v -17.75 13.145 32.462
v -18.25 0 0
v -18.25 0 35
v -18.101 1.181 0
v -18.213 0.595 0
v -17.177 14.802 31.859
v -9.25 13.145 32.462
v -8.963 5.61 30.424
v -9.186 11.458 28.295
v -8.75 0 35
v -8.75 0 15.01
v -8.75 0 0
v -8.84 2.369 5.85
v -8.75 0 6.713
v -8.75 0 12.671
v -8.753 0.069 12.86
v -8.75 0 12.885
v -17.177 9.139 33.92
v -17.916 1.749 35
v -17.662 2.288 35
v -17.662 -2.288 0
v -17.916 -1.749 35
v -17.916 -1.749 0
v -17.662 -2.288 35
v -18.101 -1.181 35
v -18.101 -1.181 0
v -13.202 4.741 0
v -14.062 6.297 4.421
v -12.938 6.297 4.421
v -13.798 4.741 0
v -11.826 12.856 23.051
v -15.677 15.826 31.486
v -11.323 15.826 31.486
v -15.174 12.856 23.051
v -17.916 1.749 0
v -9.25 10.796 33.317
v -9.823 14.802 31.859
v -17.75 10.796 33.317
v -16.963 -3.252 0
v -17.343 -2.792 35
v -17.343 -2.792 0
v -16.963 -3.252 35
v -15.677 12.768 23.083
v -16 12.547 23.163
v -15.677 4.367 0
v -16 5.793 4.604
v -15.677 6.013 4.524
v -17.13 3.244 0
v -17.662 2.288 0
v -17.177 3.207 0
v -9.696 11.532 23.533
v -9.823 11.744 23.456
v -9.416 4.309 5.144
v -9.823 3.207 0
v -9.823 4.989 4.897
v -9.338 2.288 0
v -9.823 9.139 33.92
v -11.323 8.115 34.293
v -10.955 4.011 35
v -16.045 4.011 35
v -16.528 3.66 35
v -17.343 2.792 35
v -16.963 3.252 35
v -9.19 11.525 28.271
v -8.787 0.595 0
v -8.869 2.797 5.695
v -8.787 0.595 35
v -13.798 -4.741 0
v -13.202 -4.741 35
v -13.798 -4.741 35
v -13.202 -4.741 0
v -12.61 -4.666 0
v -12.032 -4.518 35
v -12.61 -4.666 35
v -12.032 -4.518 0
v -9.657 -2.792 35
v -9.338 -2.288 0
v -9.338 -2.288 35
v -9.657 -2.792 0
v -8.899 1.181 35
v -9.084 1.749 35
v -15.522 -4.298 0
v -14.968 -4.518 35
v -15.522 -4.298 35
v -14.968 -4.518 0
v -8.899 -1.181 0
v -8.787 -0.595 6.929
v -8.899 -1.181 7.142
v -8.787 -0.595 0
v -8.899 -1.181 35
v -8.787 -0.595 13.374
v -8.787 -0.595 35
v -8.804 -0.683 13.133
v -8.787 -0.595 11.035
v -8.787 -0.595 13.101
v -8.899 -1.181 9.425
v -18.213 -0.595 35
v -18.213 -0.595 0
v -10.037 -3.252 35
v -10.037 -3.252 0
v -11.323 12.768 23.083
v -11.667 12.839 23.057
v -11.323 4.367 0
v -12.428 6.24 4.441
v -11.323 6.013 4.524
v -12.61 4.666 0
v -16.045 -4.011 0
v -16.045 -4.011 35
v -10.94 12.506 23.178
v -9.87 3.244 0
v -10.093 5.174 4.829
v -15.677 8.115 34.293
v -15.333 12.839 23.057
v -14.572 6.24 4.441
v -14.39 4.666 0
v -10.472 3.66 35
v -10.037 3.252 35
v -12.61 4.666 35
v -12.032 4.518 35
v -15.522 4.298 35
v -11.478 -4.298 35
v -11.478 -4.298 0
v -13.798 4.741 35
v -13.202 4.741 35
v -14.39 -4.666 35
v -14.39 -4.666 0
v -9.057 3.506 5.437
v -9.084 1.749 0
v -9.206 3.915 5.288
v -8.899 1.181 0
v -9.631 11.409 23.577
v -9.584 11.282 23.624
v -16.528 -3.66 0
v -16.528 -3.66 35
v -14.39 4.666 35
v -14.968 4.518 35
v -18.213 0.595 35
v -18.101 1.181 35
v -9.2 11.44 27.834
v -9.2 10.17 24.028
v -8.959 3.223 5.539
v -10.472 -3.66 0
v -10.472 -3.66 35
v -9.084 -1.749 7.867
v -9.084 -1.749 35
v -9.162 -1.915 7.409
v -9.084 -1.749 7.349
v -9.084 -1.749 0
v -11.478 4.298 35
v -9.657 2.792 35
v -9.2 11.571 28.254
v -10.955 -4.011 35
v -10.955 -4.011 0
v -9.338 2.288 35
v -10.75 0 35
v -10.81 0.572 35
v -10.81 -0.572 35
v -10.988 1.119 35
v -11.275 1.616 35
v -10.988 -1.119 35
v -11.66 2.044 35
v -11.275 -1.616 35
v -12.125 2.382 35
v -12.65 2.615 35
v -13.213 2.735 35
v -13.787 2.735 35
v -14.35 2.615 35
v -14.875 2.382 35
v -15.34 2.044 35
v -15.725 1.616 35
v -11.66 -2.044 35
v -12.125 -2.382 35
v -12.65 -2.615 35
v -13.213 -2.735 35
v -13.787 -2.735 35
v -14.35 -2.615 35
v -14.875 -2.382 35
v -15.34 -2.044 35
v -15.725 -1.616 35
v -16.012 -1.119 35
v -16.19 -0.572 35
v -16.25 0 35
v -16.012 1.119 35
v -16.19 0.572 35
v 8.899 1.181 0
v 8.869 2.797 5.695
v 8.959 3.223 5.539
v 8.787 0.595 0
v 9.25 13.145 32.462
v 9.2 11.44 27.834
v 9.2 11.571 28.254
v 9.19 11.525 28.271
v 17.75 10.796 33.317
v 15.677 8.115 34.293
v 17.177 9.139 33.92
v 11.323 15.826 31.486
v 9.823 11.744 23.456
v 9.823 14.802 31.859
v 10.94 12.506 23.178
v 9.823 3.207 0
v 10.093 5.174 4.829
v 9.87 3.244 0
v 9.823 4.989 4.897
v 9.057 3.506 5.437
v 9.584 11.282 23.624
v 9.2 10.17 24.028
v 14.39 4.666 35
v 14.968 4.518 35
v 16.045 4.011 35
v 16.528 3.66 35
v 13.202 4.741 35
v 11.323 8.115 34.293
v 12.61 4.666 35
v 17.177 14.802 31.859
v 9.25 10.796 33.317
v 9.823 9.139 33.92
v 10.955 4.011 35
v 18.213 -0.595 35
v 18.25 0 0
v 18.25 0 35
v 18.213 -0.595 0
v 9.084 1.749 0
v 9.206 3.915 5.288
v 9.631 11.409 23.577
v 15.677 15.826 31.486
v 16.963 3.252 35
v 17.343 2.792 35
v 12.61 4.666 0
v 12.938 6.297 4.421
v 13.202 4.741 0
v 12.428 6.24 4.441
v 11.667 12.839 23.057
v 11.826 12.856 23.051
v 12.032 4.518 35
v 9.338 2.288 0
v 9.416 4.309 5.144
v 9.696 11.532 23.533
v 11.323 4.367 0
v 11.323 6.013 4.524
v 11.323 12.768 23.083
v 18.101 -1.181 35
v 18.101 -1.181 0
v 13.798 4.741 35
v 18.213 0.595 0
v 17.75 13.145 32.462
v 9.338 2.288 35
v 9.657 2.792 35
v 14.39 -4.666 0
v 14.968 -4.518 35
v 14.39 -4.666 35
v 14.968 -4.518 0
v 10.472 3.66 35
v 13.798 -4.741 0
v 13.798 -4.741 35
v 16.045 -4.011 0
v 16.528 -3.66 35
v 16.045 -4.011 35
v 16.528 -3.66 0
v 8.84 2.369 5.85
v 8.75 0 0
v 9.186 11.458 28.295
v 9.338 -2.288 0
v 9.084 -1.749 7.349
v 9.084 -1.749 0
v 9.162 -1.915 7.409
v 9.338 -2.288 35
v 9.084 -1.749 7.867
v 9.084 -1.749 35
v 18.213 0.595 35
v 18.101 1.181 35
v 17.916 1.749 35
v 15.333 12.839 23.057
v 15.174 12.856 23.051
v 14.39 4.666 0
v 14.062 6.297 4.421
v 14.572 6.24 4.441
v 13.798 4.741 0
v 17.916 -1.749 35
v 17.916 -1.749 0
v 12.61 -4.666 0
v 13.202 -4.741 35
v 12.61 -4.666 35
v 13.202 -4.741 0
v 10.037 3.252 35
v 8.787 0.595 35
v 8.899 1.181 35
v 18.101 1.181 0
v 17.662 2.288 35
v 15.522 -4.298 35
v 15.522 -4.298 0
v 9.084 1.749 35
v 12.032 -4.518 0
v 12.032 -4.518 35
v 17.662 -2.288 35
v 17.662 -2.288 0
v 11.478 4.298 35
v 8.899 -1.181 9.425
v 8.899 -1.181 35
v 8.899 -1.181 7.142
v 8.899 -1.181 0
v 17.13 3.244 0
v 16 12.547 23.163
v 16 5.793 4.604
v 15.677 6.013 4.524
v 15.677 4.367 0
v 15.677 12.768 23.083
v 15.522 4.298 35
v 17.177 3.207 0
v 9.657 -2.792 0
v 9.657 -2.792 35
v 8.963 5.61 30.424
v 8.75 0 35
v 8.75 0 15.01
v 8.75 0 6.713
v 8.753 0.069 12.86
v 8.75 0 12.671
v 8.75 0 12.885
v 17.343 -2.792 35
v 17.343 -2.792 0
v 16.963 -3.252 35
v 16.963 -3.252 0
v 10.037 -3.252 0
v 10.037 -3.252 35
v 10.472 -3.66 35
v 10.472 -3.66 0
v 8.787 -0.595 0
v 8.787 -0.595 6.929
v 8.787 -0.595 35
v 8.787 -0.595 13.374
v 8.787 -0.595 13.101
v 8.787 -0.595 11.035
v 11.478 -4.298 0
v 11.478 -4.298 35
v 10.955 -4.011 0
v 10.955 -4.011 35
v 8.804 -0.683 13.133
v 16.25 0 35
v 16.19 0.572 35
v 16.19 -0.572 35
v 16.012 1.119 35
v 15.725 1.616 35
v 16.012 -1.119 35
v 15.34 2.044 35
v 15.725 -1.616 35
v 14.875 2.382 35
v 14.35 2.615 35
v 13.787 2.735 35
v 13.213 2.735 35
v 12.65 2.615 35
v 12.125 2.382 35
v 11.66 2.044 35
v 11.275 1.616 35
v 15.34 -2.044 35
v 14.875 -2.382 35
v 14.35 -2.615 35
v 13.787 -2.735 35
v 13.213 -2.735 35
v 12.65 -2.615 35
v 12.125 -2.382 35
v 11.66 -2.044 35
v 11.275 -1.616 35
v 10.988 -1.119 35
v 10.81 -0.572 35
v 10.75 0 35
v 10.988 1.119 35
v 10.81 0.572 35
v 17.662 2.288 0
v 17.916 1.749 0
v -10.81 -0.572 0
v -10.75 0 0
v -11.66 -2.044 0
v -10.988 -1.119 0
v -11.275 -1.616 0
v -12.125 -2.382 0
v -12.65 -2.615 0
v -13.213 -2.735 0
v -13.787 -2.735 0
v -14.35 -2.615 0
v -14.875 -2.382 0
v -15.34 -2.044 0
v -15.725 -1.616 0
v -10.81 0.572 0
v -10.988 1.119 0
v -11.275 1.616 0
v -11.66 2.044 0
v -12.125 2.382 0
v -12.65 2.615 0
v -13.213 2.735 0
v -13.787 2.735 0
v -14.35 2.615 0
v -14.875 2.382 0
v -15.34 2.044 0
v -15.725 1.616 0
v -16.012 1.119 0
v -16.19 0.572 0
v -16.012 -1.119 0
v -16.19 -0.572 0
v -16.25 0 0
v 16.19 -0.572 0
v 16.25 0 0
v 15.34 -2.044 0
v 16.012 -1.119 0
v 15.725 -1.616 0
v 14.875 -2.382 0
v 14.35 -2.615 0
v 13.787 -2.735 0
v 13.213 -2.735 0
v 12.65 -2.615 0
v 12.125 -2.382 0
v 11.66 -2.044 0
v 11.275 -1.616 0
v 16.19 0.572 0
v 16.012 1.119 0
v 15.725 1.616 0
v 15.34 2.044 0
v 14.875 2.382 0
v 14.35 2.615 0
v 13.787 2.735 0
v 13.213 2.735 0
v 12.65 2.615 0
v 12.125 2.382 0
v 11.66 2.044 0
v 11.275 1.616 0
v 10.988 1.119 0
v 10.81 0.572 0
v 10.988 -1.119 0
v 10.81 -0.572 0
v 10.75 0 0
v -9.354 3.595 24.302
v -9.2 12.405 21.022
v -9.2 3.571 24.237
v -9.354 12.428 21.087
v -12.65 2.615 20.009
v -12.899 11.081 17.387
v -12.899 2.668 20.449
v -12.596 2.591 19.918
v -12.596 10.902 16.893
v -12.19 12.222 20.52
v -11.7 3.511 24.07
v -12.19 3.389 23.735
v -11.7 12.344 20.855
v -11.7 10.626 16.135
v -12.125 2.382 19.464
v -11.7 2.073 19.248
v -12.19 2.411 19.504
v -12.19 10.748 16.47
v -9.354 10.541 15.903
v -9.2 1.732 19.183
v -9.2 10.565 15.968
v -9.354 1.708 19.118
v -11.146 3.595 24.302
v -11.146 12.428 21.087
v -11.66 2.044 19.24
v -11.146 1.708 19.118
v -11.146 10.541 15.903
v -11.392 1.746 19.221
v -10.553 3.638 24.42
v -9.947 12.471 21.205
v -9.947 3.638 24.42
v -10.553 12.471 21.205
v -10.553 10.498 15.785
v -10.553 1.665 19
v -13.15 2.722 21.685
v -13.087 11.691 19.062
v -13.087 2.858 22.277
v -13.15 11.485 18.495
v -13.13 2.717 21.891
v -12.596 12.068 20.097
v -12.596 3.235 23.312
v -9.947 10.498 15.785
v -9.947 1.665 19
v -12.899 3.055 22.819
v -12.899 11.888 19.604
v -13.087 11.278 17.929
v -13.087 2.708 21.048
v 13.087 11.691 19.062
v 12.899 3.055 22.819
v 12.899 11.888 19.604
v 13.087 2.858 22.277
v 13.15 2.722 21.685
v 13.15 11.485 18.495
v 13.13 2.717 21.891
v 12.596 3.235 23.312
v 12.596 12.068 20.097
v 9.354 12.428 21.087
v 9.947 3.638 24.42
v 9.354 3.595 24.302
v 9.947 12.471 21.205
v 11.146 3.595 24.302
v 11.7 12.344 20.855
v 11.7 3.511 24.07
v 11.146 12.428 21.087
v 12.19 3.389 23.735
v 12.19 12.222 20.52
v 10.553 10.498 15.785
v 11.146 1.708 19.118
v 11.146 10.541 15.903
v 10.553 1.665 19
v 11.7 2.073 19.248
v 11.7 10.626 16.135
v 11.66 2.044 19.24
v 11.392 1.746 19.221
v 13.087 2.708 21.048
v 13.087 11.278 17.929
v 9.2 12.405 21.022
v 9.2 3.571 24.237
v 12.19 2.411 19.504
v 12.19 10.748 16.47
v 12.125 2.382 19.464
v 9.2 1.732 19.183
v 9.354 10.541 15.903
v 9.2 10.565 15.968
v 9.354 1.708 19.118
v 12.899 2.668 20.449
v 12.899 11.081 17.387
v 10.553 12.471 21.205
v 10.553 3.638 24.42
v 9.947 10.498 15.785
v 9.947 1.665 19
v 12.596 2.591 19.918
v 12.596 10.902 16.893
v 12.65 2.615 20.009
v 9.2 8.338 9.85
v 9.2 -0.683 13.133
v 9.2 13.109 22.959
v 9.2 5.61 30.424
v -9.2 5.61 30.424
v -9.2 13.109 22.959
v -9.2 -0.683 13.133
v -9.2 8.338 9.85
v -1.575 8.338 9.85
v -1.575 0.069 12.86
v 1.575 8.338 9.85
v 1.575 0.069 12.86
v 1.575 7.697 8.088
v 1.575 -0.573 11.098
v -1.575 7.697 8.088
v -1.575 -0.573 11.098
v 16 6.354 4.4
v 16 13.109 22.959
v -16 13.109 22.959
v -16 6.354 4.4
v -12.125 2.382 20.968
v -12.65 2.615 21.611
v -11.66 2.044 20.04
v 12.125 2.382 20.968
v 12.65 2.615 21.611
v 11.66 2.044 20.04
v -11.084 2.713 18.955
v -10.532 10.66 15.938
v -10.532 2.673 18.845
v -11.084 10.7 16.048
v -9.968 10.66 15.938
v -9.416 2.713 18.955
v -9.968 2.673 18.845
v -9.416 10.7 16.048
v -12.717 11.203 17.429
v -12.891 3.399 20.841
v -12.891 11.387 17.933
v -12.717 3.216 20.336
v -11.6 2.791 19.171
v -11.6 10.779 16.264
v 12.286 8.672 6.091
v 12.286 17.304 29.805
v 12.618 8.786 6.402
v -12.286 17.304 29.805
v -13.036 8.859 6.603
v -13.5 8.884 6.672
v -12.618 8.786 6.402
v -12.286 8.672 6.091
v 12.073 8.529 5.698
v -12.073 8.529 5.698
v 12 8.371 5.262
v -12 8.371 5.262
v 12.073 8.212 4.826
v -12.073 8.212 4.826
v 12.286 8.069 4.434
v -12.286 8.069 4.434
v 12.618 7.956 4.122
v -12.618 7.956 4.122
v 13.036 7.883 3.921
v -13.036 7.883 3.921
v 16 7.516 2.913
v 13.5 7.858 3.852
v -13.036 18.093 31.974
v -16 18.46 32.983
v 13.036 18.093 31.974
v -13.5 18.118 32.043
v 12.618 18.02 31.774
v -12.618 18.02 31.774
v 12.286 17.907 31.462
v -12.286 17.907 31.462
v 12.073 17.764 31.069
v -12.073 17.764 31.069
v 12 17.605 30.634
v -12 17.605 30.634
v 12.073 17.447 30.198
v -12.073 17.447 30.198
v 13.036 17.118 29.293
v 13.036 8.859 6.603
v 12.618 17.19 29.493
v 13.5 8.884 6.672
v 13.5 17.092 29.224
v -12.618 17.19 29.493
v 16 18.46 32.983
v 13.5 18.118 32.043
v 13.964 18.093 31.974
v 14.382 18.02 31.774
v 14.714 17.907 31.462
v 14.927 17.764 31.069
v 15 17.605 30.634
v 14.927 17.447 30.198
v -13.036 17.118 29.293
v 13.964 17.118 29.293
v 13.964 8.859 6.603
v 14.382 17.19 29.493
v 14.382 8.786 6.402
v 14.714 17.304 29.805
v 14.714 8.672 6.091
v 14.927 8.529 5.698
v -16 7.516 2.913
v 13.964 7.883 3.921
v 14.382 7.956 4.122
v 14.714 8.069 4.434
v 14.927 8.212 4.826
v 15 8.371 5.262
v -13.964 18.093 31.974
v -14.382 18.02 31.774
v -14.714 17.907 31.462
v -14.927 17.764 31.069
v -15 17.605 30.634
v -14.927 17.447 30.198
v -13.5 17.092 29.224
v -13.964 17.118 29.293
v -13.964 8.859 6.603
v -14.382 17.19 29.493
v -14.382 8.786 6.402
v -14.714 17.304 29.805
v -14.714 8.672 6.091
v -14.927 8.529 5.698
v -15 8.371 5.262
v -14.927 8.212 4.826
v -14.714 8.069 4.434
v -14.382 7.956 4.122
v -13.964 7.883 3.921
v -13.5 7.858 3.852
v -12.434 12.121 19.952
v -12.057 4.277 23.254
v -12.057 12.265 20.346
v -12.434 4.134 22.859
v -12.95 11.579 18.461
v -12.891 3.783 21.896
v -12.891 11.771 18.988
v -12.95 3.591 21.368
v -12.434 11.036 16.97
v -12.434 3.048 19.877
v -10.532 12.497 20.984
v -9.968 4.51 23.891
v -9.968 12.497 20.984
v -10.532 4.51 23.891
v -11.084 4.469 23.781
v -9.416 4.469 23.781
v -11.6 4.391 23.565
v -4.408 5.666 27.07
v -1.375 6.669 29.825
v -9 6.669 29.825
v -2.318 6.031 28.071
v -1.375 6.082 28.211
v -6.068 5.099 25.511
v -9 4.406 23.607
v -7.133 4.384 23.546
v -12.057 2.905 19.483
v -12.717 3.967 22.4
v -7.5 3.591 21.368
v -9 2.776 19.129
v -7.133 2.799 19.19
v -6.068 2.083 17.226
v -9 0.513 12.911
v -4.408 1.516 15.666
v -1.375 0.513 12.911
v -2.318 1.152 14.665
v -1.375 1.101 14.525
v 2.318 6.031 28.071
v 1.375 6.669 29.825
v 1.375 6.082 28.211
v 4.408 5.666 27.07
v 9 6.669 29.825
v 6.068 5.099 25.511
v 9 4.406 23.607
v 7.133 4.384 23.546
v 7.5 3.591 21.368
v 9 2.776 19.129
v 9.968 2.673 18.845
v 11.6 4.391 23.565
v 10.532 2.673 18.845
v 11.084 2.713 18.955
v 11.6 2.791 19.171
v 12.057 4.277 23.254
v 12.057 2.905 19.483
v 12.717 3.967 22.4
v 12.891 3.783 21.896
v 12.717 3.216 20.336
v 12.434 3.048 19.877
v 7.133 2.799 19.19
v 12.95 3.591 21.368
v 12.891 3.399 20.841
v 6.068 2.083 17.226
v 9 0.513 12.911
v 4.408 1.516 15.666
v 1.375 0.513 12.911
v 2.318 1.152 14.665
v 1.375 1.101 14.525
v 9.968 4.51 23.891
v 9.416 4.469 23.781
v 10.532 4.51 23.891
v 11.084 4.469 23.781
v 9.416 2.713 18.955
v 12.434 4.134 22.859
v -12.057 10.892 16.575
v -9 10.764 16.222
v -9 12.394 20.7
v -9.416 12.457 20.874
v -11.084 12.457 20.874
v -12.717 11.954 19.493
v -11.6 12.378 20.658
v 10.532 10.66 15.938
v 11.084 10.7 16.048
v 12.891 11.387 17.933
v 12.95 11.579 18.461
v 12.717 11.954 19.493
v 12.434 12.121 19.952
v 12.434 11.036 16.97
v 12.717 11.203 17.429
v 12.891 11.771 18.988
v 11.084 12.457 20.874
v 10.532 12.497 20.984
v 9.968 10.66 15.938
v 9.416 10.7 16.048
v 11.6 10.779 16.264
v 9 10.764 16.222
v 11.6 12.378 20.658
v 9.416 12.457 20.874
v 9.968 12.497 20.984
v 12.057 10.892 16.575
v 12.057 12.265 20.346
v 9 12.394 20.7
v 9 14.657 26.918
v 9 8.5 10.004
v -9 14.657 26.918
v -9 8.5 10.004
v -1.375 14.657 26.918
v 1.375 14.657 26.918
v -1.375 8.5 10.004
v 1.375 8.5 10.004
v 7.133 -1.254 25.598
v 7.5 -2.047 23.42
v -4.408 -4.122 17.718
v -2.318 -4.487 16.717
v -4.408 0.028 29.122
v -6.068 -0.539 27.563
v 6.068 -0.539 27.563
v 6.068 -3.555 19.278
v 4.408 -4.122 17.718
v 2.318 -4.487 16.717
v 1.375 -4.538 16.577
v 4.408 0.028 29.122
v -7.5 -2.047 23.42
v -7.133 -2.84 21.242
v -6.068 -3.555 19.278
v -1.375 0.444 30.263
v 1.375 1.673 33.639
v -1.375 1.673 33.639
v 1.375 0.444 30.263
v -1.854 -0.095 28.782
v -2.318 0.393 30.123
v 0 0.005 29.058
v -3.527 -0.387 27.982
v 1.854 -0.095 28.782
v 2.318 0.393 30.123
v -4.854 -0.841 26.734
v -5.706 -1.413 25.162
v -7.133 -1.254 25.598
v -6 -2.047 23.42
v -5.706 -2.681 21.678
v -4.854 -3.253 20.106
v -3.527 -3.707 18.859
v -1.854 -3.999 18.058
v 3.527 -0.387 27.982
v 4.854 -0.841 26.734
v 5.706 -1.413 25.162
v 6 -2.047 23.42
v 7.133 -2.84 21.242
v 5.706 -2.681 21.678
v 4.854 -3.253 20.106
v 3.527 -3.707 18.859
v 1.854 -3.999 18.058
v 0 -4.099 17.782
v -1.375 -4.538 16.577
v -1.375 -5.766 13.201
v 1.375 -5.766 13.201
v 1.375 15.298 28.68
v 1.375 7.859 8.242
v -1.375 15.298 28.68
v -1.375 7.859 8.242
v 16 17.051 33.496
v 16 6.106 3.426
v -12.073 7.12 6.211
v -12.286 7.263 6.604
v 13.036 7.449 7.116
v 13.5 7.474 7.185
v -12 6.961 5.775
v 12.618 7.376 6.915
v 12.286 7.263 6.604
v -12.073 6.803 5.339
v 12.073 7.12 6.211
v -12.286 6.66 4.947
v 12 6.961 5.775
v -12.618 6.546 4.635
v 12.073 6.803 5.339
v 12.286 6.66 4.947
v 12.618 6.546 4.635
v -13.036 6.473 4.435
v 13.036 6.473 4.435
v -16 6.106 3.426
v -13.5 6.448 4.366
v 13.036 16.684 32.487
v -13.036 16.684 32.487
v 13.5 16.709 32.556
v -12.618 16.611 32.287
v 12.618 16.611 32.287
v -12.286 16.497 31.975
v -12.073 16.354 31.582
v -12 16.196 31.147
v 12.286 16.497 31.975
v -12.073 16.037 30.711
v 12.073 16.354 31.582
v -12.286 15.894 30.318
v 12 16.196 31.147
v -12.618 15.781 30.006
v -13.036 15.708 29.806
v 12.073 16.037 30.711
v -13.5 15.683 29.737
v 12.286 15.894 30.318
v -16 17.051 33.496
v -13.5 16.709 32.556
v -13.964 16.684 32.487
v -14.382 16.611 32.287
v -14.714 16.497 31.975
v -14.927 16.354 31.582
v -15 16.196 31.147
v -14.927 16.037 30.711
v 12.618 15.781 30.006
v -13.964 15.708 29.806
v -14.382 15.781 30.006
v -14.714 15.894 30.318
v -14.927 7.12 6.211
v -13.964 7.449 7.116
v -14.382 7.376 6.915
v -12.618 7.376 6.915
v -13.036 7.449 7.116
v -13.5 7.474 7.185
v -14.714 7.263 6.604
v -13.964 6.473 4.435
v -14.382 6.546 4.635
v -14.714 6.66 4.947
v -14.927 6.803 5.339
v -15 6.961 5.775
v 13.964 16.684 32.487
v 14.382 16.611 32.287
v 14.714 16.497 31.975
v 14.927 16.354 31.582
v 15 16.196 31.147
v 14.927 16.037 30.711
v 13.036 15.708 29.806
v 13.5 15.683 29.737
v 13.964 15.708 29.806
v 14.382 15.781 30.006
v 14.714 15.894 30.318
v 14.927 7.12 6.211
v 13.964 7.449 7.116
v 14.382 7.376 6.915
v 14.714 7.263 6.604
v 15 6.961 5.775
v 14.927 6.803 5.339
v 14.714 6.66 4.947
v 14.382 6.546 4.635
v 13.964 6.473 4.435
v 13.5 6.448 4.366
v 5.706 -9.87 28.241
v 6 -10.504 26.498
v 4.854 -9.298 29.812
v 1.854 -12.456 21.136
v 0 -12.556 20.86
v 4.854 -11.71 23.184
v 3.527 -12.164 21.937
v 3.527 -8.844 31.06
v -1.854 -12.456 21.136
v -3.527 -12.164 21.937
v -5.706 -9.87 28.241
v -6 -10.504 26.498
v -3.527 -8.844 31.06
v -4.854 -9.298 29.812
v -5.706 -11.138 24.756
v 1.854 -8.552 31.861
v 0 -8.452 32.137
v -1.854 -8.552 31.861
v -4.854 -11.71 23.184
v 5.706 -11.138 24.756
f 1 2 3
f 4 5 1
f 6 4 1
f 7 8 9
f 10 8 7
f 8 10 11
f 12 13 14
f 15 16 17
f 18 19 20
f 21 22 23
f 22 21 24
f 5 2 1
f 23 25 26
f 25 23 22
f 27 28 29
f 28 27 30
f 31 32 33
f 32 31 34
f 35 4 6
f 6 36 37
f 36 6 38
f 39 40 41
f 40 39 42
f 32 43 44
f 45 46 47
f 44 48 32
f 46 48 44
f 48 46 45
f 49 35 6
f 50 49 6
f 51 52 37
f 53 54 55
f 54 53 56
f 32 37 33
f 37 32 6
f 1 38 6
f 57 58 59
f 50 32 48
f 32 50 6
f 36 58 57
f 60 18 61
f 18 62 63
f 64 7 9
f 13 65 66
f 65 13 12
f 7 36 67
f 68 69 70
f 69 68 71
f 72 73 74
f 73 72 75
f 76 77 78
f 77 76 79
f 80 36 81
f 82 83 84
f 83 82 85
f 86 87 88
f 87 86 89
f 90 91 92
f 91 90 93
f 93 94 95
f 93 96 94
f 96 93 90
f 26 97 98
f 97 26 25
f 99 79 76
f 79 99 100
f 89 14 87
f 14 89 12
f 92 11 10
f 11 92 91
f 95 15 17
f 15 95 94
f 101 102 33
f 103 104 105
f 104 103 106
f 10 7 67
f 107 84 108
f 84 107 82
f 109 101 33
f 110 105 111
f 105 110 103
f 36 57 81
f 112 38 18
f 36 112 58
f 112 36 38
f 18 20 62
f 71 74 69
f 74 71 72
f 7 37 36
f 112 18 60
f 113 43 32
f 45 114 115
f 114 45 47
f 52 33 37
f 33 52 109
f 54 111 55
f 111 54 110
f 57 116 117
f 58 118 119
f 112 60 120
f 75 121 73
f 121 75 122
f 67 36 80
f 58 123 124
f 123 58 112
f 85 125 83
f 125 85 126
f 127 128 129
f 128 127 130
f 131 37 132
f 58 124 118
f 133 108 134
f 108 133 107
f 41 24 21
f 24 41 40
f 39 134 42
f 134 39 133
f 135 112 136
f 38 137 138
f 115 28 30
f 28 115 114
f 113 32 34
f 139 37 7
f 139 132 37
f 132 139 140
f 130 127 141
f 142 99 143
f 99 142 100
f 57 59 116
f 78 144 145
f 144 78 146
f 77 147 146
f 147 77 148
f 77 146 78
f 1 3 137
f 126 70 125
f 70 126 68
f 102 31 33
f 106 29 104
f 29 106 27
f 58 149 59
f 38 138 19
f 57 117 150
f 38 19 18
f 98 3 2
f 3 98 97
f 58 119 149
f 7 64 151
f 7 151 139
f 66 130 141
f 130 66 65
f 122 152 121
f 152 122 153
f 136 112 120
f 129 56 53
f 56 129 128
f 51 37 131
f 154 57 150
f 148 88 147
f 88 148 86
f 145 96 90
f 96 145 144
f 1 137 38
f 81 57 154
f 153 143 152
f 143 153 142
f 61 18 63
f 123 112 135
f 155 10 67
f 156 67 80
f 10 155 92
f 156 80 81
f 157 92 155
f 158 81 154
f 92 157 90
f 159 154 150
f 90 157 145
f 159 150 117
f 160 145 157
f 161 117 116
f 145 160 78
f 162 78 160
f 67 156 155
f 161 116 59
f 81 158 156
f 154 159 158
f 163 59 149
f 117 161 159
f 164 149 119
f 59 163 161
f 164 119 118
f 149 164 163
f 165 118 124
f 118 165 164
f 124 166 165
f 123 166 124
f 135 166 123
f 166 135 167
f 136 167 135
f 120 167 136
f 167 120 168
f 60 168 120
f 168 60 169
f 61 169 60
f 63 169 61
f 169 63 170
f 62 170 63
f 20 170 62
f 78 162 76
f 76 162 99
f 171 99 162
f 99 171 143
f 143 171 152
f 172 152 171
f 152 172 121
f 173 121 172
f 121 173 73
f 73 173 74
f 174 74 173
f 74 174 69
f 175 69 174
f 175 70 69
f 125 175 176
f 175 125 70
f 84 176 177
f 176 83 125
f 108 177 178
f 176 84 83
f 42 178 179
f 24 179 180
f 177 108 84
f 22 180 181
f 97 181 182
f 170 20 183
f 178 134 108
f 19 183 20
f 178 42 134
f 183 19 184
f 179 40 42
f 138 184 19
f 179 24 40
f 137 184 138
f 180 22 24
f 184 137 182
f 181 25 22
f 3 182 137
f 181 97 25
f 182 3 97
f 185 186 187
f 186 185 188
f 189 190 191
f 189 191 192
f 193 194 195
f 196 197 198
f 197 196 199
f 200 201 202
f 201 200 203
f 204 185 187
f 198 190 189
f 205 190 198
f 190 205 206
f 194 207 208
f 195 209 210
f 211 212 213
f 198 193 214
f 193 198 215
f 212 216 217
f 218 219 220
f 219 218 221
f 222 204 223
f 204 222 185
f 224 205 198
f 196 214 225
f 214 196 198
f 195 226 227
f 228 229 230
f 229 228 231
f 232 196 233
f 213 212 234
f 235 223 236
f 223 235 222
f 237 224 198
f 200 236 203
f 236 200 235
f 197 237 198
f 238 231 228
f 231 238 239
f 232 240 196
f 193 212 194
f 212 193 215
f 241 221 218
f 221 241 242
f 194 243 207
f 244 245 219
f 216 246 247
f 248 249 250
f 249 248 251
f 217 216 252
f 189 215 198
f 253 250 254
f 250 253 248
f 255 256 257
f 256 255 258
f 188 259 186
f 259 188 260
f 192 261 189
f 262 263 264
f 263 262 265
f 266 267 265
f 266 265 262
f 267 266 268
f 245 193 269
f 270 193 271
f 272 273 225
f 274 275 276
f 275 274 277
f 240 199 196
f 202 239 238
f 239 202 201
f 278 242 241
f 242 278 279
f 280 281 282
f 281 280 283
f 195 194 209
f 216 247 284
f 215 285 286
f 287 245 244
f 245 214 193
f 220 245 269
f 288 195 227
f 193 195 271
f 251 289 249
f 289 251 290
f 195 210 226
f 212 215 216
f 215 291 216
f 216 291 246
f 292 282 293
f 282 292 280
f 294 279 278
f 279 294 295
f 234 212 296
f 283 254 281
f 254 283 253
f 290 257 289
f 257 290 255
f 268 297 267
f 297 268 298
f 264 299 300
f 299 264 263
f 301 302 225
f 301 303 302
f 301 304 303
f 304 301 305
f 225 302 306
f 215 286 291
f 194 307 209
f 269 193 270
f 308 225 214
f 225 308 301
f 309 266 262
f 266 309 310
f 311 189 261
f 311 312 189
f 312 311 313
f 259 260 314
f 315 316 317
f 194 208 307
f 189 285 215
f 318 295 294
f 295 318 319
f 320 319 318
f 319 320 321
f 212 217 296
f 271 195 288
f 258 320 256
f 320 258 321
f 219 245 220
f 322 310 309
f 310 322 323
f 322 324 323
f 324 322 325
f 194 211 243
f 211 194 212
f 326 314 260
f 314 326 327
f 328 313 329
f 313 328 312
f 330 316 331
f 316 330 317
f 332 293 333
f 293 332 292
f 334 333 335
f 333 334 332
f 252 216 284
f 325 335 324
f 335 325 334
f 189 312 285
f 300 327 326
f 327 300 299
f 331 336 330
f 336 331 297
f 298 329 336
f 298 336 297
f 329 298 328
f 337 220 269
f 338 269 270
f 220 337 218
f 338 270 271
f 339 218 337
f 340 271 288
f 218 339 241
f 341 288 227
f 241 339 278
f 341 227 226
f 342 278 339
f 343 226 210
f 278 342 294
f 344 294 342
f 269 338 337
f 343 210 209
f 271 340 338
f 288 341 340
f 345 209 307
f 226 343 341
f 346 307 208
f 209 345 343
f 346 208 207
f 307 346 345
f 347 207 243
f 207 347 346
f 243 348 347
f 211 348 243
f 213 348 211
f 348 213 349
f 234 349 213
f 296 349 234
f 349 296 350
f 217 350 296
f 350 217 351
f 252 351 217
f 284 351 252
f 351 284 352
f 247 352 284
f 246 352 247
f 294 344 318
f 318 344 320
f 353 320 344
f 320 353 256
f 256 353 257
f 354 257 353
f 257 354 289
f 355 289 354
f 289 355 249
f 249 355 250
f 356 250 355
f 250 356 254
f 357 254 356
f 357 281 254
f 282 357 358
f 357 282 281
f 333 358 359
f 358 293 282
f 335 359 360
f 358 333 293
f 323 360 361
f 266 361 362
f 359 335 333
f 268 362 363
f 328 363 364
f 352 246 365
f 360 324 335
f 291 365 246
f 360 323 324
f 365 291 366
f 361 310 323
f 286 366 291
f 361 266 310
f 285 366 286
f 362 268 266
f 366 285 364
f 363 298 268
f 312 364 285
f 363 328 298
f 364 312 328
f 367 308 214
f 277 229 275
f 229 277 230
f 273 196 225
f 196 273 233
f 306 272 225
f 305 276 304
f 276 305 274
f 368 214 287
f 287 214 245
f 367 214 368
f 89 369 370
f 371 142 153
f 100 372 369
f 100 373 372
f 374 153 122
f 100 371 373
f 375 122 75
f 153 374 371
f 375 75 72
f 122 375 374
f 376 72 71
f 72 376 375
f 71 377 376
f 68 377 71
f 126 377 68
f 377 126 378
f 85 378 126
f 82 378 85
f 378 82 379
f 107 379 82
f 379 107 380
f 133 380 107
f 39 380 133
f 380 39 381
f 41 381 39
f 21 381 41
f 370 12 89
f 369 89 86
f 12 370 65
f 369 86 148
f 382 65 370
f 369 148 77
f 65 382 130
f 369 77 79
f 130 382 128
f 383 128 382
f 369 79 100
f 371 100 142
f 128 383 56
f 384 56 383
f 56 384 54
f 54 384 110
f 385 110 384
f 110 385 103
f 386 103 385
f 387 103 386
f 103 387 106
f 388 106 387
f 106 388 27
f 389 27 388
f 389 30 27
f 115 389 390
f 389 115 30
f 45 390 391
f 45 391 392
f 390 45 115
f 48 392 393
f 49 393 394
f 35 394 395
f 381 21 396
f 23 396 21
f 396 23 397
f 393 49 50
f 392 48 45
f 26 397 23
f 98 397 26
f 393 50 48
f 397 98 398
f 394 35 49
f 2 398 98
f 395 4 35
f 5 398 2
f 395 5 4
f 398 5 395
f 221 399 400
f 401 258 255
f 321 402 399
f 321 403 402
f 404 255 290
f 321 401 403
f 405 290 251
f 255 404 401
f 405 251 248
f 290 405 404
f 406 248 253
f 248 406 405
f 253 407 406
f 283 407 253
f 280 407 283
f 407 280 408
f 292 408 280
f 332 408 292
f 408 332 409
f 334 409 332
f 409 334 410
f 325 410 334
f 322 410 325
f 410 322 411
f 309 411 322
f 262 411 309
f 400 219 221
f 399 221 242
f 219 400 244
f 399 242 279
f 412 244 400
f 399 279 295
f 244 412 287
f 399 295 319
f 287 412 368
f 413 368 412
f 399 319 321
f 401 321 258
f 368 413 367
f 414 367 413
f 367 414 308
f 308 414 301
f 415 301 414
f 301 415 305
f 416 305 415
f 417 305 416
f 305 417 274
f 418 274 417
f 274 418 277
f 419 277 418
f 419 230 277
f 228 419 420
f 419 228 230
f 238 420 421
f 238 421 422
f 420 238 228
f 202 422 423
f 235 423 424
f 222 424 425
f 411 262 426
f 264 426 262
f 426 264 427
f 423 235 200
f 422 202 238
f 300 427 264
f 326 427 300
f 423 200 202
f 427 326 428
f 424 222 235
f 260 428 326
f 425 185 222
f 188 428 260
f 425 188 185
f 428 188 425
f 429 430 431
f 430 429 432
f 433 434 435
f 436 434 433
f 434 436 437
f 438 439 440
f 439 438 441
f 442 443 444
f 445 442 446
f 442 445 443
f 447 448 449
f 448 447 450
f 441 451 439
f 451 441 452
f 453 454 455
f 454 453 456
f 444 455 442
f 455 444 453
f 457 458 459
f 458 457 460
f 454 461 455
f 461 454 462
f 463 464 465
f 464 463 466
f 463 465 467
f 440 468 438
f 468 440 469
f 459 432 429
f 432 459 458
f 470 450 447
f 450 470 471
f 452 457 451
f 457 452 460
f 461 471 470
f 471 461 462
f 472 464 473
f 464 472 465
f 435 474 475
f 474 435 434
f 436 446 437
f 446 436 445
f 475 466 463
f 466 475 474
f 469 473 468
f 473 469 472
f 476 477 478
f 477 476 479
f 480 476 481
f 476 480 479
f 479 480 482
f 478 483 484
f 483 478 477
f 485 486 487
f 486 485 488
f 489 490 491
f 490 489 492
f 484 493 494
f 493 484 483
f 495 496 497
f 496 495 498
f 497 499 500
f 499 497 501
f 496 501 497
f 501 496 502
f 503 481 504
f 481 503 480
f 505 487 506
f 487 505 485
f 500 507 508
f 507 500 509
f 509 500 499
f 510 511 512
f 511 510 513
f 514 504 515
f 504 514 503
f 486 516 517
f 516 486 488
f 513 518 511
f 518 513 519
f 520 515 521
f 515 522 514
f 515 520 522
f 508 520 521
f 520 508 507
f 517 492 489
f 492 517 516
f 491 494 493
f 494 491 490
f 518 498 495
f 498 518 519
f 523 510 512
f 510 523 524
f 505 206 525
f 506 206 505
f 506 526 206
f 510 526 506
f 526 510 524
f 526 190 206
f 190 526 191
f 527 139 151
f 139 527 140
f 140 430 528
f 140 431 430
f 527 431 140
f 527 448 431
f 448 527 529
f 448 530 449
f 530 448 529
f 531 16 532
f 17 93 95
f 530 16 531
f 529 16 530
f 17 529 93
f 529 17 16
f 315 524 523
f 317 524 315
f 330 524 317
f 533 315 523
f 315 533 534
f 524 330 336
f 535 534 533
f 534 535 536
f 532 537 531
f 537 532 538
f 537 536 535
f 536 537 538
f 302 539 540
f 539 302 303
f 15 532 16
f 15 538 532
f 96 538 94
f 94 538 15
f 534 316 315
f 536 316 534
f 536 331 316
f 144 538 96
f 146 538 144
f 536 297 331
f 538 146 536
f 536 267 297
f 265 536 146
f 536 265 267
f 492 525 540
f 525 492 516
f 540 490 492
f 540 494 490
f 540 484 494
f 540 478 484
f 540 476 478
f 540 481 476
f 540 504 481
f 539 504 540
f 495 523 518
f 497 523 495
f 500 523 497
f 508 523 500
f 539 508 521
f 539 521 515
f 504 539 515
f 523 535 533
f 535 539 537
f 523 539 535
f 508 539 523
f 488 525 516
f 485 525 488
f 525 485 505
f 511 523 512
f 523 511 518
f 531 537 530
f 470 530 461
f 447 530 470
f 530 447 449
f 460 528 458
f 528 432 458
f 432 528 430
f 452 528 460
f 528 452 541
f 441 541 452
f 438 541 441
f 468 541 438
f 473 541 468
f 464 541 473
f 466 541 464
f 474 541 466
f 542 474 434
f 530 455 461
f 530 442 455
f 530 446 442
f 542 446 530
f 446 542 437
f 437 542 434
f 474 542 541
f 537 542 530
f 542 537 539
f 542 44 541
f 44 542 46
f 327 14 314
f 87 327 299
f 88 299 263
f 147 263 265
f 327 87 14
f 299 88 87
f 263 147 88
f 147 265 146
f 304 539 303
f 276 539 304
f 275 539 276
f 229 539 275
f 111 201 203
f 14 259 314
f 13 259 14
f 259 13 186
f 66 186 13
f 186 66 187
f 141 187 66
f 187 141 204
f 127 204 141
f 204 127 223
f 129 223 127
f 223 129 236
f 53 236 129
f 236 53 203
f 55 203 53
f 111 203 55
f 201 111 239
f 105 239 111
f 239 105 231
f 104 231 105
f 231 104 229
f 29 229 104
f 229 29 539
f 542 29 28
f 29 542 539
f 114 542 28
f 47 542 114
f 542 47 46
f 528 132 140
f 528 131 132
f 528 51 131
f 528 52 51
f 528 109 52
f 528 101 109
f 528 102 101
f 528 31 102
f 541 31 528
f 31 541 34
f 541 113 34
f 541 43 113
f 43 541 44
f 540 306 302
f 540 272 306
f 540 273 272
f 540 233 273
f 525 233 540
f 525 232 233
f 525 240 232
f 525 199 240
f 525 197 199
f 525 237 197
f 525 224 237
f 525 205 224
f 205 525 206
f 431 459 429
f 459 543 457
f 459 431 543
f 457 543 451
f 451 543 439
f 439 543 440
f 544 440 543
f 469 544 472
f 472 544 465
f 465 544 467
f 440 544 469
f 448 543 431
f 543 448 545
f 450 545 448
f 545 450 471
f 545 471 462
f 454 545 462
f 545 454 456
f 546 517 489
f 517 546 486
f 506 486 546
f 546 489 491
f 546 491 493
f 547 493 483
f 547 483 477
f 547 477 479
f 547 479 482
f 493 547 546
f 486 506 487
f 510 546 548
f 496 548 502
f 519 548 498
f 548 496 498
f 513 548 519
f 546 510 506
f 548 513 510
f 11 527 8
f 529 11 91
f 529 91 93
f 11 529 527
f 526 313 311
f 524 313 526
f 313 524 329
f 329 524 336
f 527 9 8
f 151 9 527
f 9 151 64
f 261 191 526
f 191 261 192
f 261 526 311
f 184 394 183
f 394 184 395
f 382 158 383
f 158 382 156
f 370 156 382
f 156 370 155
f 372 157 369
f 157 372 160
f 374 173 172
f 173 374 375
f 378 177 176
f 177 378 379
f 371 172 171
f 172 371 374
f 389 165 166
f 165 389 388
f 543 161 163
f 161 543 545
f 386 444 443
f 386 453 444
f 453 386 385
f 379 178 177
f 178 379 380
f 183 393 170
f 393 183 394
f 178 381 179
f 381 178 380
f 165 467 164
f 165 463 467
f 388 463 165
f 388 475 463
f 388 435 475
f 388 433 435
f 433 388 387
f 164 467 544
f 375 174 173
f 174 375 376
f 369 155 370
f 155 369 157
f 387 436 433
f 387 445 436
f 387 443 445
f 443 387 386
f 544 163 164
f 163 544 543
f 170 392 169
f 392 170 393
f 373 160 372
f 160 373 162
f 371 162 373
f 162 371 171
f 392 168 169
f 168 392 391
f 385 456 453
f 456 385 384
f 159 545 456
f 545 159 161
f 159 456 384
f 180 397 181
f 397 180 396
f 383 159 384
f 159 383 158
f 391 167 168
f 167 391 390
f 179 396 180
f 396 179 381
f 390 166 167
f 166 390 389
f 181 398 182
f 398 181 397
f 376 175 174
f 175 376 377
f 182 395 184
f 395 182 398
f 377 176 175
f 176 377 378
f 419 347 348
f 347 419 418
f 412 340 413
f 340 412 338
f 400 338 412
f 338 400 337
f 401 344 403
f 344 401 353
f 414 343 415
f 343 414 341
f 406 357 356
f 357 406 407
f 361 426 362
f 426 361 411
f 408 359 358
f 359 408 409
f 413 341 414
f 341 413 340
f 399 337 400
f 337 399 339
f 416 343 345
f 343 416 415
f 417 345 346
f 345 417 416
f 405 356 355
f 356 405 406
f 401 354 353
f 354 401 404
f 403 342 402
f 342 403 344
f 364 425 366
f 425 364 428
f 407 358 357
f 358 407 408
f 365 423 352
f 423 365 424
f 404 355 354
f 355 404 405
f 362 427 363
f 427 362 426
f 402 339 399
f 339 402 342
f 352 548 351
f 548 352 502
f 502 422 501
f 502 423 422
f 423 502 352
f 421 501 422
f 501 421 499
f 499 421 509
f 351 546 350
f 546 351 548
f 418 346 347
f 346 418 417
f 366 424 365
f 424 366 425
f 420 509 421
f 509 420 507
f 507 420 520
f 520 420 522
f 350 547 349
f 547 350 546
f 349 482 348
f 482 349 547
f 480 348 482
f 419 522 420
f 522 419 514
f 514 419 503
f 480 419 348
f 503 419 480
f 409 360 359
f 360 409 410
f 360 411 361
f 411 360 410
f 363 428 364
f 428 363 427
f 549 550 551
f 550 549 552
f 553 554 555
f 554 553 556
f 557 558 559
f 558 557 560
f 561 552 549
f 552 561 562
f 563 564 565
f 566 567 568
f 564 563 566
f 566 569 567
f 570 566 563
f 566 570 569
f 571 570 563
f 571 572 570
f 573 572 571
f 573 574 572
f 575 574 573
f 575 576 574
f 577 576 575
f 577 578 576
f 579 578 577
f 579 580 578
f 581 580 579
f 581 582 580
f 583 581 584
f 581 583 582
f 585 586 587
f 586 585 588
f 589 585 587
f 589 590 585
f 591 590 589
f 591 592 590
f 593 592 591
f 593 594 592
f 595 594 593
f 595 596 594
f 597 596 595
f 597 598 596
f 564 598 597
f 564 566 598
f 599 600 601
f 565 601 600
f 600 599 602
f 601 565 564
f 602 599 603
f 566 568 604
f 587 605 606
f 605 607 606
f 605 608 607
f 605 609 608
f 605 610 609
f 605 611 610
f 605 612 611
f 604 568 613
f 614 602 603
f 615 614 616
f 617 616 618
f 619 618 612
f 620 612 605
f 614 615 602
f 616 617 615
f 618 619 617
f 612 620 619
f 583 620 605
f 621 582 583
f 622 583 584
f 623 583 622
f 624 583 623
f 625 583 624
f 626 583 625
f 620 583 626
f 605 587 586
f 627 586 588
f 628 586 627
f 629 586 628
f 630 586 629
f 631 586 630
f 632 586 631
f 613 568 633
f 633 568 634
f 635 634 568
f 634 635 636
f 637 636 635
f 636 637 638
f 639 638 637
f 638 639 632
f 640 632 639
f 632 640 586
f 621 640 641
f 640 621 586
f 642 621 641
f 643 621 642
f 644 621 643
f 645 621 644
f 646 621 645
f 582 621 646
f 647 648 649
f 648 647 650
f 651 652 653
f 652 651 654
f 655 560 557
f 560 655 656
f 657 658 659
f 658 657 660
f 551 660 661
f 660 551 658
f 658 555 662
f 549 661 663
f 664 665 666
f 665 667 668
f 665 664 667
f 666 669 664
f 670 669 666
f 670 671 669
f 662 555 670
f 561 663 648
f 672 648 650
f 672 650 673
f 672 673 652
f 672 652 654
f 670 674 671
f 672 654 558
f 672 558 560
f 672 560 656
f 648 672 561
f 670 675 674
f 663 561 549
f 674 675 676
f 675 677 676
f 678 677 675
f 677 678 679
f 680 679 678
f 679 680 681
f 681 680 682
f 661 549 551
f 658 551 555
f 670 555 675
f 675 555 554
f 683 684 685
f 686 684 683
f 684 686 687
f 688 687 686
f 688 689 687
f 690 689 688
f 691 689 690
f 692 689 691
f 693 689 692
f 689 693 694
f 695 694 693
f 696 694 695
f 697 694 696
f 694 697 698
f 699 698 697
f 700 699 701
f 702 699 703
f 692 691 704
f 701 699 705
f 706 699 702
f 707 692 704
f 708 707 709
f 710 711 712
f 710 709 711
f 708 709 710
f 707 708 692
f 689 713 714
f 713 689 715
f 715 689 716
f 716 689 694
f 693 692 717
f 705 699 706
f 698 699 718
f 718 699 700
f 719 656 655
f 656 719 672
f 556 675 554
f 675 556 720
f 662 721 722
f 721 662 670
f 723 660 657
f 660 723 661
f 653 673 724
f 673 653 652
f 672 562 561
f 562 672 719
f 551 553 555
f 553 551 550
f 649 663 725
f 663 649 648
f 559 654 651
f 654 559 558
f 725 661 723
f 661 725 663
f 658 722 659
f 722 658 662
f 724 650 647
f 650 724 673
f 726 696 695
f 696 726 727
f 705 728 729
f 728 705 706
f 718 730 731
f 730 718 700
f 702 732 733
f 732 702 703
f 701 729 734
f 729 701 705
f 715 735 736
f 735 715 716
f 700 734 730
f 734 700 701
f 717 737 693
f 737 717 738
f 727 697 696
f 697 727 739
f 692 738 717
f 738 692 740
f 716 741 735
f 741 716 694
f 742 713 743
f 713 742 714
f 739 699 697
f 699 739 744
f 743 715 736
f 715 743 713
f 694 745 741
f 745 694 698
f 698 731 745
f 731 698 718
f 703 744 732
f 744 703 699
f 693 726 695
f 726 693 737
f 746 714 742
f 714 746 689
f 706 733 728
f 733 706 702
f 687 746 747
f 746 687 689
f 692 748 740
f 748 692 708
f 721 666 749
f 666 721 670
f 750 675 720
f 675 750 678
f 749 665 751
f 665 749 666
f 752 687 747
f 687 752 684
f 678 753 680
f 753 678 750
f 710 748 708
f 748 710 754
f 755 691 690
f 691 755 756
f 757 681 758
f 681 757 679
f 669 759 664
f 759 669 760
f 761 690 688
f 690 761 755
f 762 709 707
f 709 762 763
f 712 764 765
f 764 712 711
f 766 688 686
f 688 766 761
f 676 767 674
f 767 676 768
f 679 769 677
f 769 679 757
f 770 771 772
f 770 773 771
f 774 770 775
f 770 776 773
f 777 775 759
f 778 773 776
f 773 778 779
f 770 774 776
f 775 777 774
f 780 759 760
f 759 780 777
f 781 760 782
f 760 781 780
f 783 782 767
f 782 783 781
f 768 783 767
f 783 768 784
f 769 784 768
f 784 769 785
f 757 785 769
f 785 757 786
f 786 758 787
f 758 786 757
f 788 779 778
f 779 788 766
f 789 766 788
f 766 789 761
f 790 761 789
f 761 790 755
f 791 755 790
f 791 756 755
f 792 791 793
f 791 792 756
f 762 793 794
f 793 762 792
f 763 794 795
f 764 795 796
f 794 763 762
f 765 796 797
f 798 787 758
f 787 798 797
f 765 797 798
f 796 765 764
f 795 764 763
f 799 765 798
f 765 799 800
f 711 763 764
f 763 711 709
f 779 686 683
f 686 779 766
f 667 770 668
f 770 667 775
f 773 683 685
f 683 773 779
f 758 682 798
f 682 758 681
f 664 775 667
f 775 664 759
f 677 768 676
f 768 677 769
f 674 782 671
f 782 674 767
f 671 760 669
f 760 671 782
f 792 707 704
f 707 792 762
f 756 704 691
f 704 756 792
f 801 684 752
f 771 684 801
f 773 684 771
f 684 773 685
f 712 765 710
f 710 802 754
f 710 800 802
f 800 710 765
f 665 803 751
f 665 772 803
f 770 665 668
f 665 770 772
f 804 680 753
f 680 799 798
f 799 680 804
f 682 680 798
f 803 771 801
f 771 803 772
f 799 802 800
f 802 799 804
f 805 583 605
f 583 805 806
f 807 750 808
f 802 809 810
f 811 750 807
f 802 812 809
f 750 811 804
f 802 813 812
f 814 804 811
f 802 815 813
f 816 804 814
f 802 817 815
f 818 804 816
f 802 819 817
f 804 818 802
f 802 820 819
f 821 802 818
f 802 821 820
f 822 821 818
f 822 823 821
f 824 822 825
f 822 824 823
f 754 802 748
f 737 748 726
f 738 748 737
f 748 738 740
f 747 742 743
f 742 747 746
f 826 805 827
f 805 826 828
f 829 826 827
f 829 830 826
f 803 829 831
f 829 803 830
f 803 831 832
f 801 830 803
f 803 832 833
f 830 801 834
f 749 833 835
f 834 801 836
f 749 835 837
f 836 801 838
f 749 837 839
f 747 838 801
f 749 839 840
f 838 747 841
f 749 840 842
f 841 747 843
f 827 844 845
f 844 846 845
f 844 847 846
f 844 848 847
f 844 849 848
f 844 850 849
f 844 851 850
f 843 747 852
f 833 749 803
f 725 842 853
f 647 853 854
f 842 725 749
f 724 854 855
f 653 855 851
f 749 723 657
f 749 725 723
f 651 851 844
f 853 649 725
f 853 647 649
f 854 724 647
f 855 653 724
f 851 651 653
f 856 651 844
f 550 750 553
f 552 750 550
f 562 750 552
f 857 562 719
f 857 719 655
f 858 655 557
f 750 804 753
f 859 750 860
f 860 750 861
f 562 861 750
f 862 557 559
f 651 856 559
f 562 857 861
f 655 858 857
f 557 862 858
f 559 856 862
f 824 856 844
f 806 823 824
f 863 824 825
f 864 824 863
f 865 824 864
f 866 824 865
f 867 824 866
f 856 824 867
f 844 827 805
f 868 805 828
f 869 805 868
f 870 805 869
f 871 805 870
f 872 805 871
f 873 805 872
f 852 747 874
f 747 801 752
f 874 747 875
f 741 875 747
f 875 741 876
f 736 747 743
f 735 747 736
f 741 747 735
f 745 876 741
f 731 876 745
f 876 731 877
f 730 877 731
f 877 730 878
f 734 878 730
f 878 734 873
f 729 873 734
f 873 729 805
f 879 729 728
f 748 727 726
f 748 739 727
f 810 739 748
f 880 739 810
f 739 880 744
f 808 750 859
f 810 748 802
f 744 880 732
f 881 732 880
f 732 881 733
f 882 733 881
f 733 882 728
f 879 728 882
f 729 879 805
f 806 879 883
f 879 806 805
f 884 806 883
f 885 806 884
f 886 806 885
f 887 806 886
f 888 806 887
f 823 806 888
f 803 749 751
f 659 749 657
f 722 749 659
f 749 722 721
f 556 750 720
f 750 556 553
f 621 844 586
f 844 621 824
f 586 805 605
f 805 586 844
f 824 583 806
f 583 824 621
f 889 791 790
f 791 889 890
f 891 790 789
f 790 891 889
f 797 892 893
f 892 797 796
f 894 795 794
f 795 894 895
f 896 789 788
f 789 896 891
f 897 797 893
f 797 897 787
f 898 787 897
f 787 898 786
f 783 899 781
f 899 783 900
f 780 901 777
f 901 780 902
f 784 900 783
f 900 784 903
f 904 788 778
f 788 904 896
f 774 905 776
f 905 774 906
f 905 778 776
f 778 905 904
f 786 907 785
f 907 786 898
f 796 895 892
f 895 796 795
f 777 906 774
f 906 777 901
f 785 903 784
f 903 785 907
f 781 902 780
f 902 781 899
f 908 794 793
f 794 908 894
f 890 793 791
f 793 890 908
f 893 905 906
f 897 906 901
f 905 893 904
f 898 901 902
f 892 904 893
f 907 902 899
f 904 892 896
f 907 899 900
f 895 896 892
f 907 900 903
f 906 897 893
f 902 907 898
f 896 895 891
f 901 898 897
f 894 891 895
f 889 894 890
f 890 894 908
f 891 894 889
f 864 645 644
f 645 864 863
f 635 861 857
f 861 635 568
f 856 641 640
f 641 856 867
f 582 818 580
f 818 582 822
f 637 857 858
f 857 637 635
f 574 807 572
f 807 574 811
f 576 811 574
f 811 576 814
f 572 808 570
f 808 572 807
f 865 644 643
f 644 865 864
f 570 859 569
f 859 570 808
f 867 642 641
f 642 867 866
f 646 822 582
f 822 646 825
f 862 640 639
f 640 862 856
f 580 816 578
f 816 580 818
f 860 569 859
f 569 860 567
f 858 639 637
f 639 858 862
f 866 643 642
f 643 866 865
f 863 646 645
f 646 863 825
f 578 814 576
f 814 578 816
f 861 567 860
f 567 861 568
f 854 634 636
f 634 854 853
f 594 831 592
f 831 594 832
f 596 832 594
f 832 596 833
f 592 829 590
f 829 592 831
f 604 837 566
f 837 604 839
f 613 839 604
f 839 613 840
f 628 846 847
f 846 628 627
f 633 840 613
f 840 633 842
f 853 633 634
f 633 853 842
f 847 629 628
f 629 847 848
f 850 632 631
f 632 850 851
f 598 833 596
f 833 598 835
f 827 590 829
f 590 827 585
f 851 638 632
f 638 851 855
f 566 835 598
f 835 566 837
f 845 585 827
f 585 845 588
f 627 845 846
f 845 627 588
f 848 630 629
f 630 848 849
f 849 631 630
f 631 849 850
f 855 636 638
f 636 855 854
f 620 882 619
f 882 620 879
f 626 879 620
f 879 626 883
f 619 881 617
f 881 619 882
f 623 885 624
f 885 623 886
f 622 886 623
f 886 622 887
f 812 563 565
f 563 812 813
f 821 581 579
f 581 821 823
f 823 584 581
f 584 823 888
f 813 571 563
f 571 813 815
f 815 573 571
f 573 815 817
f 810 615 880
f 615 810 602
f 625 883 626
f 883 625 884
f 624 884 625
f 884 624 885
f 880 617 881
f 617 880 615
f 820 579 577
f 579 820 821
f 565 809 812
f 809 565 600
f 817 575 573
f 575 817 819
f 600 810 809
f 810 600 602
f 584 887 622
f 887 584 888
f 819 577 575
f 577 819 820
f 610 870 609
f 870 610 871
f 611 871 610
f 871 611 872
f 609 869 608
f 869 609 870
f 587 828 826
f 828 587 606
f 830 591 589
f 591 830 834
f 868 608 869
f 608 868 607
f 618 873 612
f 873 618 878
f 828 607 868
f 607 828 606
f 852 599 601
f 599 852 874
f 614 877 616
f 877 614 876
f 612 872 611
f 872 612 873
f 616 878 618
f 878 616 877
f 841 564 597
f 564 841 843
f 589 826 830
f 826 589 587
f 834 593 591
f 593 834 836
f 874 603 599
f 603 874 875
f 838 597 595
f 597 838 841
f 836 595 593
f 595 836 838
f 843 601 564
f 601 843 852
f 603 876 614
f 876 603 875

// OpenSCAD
// file: dronePlates.scad
/**
 * dronePlates.scad
 * Plate library
 *
 * GNU GPL V3
 * @author: Victor Potenciano
 */

m3Rad = 3.4/2;
cornerR = 4;

/**
 *
 */
module helperDisk(diameter) {
	cylinder(r = diameter/2, h = 0.6, $fn=20);
}

/**
 *
 */
module roundedRect(size, radius) {
	x = size[0];
	y = size[1];
	z = size[2];

	linear_extrude(height=z)
	hull() {
	// place 4 circles in the corners, with the given radius
	translate([(-x/2)+(radius/2), (-y/2)+(radius/2), 0]){ circle(r=radius); }
	translate([(x/2)-(radius/2), (-y/2)+(radius/2), 0]){ circle(r=radius); }
	translate([(-x/2)+(radius/2), (y/2)-(radius/2), 0]){ circle(r=radius); }
	translate([(x/2)-(radius/2), (y/2)-(radius/2), 0]){ circle(r=radius); }
	}
}

/**
 * rounded rectangle triangle with corner at origin
 */
module roundedTriangle(size, radius) {
	x = size[0];
	y = size[1];
	z = size[2];

	linear_extrude(height=z)
	hull() {
	translate([radius, radius, 0]){ circle(r=radius); }
	translate([x-radius, radius, 0]){ circle(r=radius); }
	translate([radius, y-radius, 0]){ circle(r=radius); }
	}
}

/**
 *
 */
module roundRectPlate(w, l, plateThick=3) {
	difference(){
		roundedRect([l+m3Rad*1.75,w+m3Rad*1.75,plateThick], cornerR);
		translate([l/2, w/2, -0.5]) { cylinder(h = plateThick+1, r = m3Rad, $fn=30); }
		translate([-l/2, w/2, -0.5]) { cylinder(h = plateThick+1, r = m3Rad, $fn=30); }
		translate([l/2, -w/2, -0.5]) { cylinder(h = plateThick+1, r = m3Rad, $fn=30); }
		translate([-l/2, -w/2, -0.5]) { cylinder(h = plateThick+1, r = m3Rad, $fn=30); }
	}
}

/**
 *
 */
module crossSquarePlate(l, thick=3) {
	inDist = cornerR*2+4;
	trianL = sqrt((l*l)/2)-inDist;
	centerR = 4;

	difference(){
		roundRectPlate(l, l, thick);
		translate([0, centerR, -0.5]) { 
			rotate([0,0,45]){ roundedTriangle([trianL,trianL,thick+1], cornerR-2); }
		}
		translate([0, -centerR, -0.5]) { 
			rotate([0,0,225]){ roundedTriangle([trianL,trianL,thick+1], cornerR-2); }
		}
		translate([-centerR, 0, -0.5]) { 
			rotate([0,0,135]){ roundedTriangle([trianL,trianL,thick+1], cornerR-2); }
		}
		translate([centerR, 0, -0.5]) { 
			rotate([0,0,-45]){ roundedTriangle([trianL,trianL,thick+1], cornerR-2); }
		}
	}
}

/**
 *
 */
module hShapePlate(w, l, thick=4) {
	inDist = cornerR*2+1;

	difference(){
		roundRectPlate(w, l, thick);
		translate([0, w/4, -0.5]) { roundedRect([l-inDist,w/2-inDist,thick+1], cornerR-2); }
		translate([0, -w/4, -0.5]) { roundedRect([l-inDist,w/2-inDist,thick+1], cornerR-2); }
	}
}

/**
 *
 */
module motorCircleMount(inDia, outDia, thick=3, extraH=false, d1=19, d2=16, holeR=m3Rad ) {
	difference(){
		cylinder(h = thick, r = outDia/2, $fn=30);
		motorCircleMountHoles(inDia, outDia, thick, extraH, d1=d1, d2=d2, holeR=holeR);
	}
}

/**
 *
 */
module motorCircleMountHoles(inDia, outDia, thick=3, extraH=false, d1=19, d2=16, d3=25, holeR=m3Rad) {
	translate([0, 0, -0.5]) { cylinder(h = thick+1, r = inDia/2, $fn=30); }

	for(i=[0:3]) {
		rotate([0,0,90*i]){
		translate([d1/2, 0, -0.5]) cylinder(h = thick+1, r = holeR, $fn=20);
		translate([d2/2, 0, -0.5]) cylinder(h = thick+1, r = holeR, $fn=20);
		translate([d2/2, -holeR, -0.5]) cube(size = [(d1-d2)/2,holeR*2,thick+1]);
		}
	}
	
	if(extraH==true){	
		for(i=[-1,1]) translate([i*d3/2, 0, -0.5]) { cylinder(h = thick+1, r = holeR, $fn=30); }
	}
}

/**
 *
 */
module motorRectMount(w, l, inDia, thick=3) {
	d1=19;
	d2=16;

	difference(){
		roundRectPlate(w, l, thick);
		translate([0, 0, -0.5]) { cylinder(h = thick+1, r = inDia/2, $fn=30); }
		translate([0, d1/2, -0.5]) { cylinder(h = thick+1, r = m3Rad, $fn=30); }
		translate([0, -d1/2, -0.5]) { cylinder(h = thick+1, r = m3Rad, $fn=30); }
		translate([d2/2, 0, -0.5]) { cylinder(h = thick+1, r = m3Rad, $fn=30); }
		translate([-d2/2, 0, -0.5]) { cylinder(h = thick+1, r = m3Rad, $fn=30); }
	}
}

/**
 *
 */
module tube(inDia, outDia, height) {
	difference(){
		cylinder(h = height, r = outDia/2, $fn=50);
		translate([0, 0, -0.5]) { cylinder(h = height+1, r = inDia/2, $fn=30); }
	}
}

/**
 *
 */
module squareTube(inDia, outDia, height) {
	translate([0,0,height/2]){
	difference(){
		cube(size = [outDia,outDia,height], center = true);
		cube(size = [inDia,inDia,height+1], center = true);
	}
	}
}

/**
 *
 */
module djiFlamewheelHoles(height) {
	a = 23;
	b = 16;
	c = 19.5;
	
	translate([a/2, c/2, 0]) { cylinder(h = height, r = m3Rad, $fn=30); }
	translate([-a/2, c/2, 0]) { cylinder(h = height, r = m3Rad, $fn=30); }
	translate([b/2, -c/2, 0]) { cylinder(h = height, r = m3Rad, $fn=30); }
	translate([-b/2, -c/2, 0]) { cylinder(h = height, r = m3Rad, $fn=30); }
}

/**
 *
 */
module djiFlamewheelHolesBotton(height) {
	a1 = 21;
	c = 19.5;
	
	translate([a1/2, c/2, 0]) { cylinder(h = height, r = m3Rad, $fn=30); }
	translate([-a1/2, c/2, 0]) { cylinder(h = height, r = m3Rad, $fn=30); }
}

/**
 *
 */
module propeller(size){
union(){
difference(){
	cylinder(h = 3, r = size/2, center=true, $fn=30);
	cylinder(h = 3.1, r = size/2-2, center=true, $fn=30); 
}
for( i = [-1,1] ){
rotate([0,0,45*i]){ cube(size = [size,4,1], center = true); }
}
}
}

/**
 *
 */
module slot(length, height, rad){
for(i=[-1,1]) translate([i*length/2,0,0]) cylinder(h = height, r = rad, $fn=30);
translate([0,0,height/2]) cube(size = [length,rad*2,height], center = true);
}

 

////////////////////////
// Examples:
////////////////////////

motorCircleMount(8, 25, 3.5);

//roundedRect([50,50,3], 4);

//hShapePlate(79, 25);

//rotate([0,0,45]){roundedTriangle([40,40,3], 4);}

//crossSquarePlate(45, 4);

/*
union(){
motorRectMount(21, 18, 8, 4);
translate([9, 10.5, 0]) {tube(m3Rad*2, 6.5, 6);}
}
*/

/*
difference(){
union(){
hShapePlate(50, 30, 3.5);
translate([-4,-25,0]){cube(size = [8,50,3.5]);}
rotate([0, 0, 45]) {motorCircleMount(8, 35, 3.5);}
}
cylinder(h = 10, r = 4, $fn=100, center=true);
}
*/

//rotate([90,0,0]){ tube(5,10,20); }
//translate([20,0,0]){ squareTube(5, 10, 20); }
// main file
/**
 * tweaker fpv camera mount
 */
 
use <dronePlates.scad>;

hDist = 27;//27=tweaker
height = 35;
spacerR = 5.5/2;
angle = 20;
hubSqH=10;

tolerance=0.4;
shiftY = 7.35;
shiftZ = 2.5;

/**
 *
 */
module cameraHub(tolerance=0){
sqL = 18;

translate([0,0,hubSqH/2]) cube(size=[sqL+tolerance,sqL+tolerance,hubSqH+tolerance], center=true);
cylinder(r=7.5+(tolerance/2), h=16, $fn=20);
for(i=[-1,1]) translate([i*10.25,0,0]) cylinder(h=hubSqH,r=2.7+(tolerance/2),$fn=30);
translate([0,0,16/2])cube(size=[2.75+tolerance,sqL+3.75+tolerance,16], center=true);
}//end module

/**
 *
 */
module camera(lensH=25){
difference(){
union(){
translate([0,0,1.5/2]) cube(size=[32,32,1.5], center=true);
cameraHub();
cylinder(r=6,h=lensH,$fn=20);
}
for(i=[-1,1]) for(j=[-1,1]) translate([i*27/2,j*27/2,-0.5]) cylinder(r=1.5, h=3, $fn=20);
}
}//end module

/**
 *
 */
module housing(){
difference(){
cube(size=[32,30,hubSqH-2], center=true);
scale([1,1,1.1]) translate([0,0,-hubSqH/2]) cameraHub(tolerance=tolerance);
translate([0,10,0]) cube(size=[32+1,10+0.5,hubSqH], center=true);
}
}//end module

/**
 *
 */
module pillars(){
difference(){

for(i=[-1,1]){
translate([i*hDist/2,0,0])
hull(){
	tube(spacerR*2, spacerR*2+4, height);
	rotate([-angle,0,0]) roundedRect([spacerR*2, spacerR*2, height],3);
}
}//for


translate([0,0,-10/2]) cube(size=[50,50,10], center=true);

}//diff

}//end module

///color("green") camera();
///housing();
///pillars();


difference(){
union(){
pillars();

translate([0,shiftY,height/2+shiftZ])
rotate([90-angle,0,0]){ 
color("grey") scale([1,1,1.1]) housing();
}
}//union

translate([0,shiftY,height/2+shiftZ]){
rotate([90-angle,0,0]){
color("red") translate([0,0,-hubSqH/2]) cameraHub(tolerance=tolerance);
}
}

for(i=[-1,1]) translate([i*hDist/2,0,0]) cylinder(r=spacerR, h=height, $fn=30);

}//diff


//show camera

translate([0,shiftY,height/2+shiftZ])
rotate([90-angle,0,0]){
color("green") translate([0,0,-hubSqH/2-1]) camera();
}
